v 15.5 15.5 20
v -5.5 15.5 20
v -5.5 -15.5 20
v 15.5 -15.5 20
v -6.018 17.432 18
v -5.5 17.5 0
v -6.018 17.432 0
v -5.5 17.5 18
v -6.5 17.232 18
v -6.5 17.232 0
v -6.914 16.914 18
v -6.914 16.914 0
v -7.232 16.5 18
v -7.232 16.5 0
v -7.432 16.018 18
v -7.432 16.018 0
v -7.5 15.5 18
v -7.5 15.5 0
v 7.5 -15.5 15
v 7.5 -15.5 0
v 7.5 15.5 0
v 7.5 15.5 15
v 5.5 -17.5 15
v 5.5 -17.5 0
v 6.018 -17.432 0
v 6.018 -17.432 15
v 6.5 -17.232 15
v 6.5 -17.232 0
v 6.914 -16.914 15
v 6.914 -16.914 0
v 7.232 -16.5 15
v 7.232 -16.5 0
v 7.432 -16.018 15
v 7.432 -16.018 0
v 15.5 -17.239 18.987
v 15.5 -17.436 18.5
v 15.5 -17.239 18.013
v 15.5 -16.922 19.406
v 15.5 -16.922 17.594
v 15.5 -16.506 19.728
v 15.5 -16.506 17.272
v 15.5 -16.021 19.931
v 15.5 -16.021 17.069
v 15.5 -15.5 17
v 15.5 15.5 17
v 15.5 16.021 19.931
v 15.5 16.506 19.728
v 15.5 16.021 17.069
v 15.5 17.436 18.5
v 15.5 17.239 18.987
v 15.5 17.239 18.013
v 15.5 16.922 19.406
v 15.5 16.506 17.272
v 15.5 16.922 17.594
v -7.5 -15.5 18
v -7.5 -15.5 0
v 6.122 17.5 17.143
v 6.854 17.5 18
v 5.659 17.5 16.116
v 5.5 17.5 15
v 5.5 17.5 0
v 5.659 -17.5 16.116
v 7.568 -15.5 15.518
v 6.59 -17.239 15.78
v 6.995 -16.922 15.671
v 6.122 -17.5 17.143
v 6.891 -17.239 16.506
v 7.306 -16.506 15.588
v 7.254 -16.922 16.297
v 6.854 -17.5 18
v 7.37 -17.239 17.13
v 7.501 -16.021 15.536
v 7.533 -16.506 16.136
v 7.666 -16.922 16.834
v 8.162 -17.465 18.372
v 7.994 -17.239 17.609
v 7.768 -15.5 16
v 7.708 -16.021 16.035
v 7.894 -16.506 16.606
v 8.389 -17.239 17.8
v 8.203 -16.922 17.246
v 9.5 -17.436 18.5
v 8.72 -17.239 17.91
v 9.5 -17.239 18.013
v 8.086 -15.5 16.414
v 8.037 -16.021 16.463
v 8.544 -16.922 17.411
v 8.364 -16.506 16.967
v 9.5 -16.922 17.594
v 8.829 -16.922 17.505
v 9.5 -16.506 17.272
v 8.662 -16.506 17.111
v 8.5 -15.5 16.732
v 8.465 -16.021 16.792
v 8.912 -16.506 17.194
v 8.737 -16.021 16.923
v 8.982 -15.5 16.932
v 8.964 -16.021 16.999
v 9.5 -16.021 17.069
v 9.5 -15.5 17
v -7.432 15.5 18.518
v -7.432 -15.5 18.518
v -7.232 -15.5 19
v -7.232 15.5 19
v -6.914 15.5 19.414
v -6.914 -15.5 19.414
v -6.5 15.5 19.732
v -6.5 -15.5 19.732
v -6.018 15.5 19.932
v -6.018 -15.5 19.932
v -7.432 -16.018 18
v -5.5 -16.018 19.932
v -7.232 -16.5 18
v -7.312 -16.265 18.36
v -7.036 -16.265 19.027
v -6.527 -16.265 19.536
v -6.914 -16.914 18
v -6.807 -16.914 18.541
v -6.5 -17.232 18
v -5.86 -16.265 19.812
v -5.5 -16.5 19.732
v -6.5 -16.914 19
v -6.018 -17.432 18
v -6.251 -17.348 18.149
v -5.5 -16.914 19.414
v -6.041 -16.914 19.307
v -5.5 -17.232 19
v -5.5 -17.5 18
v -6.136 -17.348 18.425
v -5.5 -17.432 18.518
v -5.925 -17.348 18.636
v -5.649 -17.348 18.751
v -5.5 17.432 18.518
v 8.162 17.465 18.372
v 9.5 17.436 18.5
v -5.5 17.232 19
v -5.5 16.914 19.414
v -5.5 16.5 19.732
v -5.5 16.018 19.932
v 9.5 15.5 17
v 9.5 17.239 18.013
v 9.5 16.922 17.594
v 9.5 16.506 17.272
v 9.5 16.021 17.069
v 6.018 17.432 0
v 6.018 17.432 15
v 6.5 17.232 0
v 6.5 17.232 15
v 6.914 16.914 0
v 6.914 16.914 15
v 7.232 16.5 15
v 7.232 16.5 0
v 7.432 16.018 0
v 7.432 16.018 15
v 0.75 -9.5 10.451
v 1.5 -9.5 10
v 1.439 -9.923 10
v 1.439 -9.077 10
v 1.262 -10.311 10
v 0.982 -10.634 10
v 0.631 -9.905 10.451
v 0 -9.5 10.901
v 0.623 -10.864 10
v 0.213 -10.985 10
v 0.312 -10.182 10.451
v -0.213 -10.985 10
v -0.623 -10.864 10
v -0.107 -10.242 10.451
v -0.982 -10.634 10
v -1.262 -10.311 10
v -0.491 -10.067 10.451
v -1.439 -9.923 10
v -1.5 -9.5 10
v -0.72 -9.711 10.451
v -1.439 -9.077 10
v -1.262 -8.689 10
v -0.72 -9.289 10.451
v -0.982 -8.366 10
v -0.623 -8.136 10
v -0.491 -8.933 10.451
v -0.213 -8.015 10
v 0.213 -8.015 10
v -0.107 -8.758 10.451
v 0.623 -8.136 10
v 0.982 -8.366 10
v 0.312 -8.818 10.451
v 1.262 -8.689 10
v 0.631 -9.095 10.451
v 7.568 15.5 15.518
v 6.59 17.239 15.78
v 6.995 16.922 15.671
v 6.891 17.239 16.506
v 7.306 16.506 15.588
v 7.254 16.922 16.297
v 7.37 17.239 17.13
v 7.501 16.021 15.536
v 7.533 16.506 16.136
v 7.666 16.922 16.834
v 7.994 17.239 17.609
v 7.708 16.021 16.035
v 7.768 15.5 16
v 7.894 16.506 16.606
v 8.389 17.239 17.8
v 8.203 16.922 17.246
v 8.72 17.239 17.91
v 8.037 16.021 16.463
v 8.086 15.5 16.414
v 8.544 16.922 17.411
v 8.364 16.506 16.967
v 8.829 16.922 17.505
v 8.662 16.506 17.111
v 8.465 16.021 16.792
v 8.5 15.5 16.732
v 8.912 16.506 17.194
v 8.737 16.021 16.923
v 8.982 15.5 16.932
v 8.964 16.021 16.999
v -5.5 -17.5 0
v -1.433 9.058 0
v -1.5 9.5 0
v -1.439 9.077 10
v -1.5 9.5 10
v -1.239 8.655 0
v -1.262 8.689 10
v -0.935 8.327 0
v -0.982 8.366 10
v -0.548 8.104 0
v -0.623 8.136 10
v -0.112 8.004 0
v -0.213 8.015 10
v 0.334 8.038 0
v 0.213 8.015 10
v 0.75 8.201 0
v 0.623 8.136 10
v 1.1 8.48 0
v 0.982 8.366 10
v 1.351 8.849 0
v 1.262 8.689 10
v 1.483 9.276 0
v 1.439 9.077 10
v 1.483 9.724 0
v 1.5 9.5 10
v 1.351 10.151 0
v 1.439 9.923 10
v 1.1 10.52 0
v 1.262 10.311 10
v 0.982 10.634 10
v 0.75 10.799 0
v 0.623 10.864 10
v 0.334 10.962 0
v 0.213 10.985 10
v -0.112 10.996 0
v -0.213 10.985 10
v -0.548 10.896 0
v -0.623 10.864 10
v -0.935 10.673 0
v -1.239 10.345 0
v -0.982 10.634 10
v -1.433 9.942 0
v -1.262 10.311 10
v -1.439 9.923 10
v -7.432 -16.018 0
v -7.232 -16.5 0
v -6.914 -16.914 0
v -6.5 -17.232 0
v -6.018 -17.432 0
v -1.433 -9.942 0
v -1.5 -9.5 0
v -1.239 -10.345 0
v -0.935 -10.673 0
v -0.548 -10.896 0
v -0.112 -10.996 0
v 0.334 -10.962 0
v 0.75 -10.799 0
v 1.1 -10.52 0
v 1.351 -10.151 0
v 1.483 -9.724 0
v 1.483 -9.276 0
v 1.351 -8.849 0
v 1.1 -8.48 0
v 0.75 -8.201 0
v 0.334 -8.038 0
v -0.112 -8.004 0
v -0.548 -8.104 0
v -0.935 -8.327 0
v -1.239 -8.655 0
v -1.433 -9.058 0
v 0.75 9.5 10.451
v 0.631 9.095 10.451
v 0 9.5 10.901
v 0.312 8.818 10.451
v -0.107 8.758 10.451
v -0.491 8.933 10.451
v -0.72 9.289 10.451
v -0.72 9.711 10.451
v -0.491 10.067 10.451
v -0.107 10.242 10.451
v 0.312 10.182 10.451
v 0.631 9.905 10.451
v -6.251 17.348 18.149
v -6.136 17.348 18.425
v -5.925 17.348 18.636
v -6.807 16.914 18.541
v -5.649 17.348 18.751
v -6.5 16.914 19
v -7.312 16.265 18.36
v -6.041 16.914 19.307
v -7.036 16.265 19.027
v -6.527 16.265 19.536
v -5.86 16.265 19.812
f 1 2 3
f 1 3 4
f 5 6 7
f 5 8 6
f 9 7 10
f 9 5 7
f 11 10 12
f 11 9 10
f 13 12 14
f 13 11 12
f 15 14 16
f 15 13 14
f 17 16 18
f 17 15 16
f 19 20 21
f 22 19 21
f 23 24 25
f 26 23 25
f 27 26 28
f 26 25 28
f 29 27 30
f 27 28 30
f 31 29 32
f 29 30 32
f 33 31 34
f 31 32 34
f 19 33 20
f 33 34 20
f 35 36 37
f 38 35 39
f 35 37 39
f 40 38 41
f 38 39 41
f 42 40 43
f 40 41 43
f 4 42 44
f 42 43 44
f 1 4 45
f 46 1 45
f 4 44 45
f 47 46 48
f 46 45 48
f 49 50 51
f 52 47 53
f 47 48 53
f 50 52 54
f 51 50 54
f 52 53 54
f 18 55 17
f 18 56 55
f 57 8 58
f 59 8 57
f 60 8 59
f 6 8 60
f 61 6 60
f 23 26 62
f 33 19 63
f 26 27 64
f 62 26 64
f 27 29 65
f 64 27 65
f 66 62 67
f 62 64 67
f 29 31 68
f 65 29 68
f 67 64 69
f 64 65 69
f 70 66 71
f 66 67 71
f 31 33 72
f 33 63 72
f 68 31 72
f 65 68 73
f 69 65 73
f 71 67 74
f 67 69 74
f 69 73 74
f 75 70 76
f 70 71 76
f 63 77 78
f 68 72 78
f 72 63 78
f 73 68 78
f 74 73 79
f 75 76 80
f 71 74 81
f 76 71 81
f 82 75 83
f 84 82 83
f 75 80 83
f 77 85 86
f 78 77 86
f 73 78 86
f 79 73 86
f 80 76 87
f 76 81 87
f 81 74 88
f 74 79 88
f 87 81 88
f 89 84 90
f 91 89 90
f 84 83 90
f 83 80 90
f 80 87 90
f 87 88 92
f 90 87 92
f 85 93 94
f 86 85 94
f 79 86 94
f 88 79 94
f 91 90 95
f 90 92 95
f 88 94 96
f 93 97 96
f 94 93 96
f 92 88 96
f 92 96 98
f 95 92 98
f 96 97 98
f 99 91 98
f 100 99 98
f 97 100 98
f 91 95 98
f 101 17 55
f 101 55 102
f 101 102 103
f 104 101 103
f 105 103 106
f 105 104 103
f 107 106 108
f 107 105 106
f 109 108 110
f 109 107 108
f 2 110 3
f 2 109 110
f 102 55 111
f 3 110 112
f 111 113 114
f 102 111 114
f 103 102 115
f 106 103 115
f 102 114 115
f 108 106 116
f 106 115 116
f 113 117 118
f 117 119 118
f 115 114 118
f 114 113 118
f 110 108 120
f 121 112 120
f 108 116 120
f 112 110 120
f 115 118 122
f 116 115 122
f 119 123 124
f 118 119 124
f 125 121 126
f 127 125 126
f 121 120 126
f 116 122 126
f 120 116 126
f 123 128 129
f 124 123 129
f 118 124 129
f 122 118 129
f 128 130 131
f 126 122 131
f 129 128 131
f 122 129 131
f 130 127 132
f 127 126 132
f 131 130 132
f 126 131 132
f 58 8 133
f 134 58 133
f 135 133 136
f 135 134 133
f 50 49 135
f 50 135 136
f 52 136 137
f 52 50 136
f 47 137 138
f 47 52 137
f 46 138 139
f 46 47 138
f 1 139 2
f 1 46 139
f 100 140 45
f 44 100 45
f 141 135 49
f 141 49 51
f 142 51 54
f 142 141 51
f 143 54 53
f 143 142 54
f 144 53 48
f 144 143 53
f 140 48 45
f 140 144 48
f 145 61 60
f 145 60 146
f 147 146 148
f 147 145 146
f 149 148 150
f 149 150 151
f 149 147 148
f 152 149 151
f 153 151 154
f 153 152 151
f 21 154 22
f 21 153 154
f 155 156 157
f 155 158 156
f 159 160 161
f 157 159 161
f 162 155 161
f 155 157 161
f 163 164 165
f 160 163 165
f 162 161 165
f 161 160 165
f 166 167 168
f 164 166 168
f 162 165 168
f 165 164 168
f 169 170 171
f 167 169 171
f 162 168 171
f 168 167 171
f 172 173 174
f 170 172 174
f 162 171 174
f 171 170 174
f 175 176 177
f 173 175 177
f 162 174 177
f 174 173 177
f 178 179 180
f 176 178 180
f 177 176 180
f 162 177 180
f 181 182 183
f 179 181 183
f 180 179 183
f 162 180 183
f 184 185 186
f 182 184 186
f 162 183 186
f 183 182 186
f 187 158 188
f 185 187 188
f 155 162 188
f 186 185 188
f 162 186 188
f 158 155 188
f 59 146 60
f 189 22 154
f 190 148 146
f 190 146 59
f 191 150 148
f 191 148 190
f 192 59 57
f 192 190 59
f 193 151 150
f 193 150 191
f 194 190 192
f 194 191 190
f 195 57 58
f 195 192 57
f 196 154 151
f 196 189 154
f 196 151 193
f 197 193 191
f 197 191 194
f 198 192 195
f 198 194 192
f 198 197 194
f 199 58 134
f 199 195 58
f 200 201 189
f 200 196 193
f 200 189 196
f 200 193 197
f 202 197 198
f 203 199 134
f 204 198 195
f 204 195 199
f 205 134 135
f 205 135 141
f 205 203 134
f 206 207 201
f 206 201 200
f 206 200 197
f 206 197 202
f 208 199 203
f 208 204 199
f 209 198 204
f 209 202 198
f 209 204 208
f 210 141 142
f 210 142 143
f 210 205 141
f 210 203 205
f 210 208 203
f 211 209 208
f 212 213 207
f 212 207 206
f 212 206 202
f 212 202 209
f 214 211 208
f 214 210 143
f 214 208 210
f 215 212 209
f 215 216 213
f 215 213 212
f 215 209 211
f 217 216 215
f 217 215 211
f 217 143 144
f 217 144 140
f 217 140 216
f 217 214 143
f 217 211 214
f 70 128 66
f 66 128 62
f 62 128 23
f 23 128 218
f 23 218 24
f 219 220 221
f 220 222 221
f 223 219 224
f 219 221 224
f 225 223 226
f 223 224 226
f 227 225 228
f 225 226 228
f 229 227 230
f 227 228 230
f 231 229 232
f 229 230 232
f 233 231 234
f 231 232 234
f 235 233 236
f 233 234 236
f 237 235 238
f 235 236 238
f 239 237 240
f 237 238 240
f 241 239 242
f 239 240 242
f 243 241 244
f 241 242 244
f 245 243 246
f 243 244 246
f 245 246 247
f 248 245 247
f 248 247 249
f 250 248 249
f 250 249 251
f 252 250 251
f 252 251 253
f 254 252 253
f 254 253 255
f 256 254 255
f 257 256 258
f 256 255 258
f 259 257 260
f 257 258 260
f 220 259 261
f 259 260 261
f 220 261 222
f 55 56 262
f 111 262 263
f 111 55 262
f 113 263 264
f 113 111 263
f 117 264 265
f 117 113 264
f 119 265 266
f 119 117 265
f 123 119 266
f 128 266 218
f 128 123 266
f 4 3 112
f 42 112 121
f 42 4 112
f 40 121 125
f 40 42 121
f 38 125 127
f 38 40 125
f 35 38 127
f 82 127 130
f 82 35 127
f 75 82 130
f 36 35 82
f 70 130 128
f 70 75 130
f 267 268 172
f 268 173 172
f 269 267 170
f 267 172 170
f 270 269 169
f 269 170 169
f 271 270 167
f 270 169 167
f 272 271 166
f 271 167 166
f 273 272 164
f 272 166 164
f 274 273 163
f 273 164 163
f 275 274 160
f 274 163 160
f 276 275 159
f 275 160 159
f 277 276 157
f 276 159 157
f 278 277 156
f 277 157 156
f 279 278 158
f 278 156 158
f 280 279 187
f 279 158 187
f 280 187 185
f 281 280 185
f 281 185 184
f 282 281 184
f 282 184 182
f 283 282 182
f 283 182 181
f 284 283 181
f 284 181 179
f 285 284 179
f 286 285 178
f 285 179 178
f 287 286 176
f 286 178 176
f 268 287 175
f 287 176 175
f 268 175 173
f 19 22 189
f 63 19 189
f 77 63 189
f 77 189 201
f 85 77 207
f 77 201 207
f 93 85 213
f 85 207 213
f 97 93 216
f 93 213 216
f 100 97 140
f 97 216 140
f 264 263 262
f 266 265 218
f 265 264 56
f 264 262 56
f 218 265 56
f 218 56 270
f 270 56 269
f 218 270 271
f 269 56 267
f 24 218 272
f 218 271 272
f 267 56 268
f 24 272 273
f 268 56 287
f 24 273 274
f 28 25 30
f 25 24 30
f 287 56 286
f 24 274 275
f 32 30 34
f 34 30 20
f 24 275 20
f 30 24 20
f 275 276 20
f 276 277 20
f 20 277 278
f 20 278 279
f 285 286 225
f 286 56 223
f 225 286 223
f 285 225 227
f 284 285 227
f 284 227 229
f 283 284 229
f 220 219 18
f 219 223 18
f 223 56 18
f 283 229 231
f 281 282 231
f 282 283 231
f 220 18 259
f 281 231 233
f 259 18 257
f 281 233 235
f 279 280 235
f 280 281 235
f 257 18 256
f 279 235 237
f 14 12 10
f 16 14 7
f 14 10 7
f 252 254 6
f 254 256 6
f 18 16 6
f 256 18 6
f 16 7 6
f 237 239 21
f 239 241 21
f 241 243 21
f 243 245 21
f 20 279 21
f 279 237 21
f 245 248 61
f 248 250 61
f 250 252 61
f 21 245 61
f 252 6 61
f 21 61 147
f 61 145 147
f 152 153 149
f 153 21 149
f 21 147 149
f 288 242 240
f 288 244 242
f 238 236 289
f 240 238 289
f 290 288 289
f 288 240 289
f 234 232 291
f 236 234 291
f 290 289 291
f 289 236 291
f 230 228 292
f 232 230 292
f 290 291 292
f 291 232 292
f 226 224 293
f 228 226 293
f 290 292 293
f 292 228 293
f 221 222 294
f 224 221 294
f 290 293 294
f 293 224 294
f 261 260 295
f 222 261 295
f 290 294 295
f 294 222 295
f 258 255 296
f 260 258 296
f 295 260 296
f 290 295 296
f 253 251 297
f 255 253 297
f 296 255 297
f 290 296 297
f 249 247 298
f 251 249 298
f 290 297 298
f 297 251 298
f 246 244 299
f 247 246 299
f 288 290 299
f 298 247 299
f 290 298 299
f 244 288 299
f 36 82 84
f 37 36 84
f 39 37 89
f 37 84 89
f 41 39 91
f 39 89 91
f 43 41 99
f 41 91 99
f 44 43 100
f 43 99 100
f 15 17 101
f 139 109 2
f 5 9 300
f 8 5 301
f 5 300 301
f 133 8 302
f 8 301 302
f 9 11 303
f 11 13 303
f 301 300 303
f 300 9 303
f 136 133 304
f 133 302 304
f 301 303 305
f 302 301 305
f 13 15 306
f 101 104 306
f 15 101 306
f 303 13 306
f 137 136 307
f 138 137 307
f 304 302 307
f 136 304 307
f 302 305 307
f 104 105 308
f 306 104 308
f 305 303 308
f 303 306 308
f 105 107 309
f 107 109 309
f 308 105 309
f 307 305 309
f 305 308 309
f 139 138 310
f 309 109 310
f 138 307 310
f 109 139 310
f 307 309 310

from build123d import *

# Parameters (mm, degrees)
F0_W         = 15
F0_H         = 35
F1_DEPTH     = 17
F2_W         = 23
F2_H         = 35
F3_DEPTH     = 3
F5_D         = 3
F5_DEPTH     = 10
F5_TIP       = 0.9012909285
F6_F1_R      = 2
F6_F2_R      = 2
F6_F3_R      = 2
F6_F4_R      = 2
F6_T5_DEPTH  = 20
F6_T7_DEPTH  = 11
F6_T10_ANGLE = 90
F6_T11_DEPTH = 20
F6_T13_DEPTH = 11
F6_T16_ANGLE = 90


# Not quite as in the source:
# - a fillet or chamfer that OpenCascade refuses, or shapes differently, is made with other operations: its cross-section is extruded or revolved along the edge and cut away or added


with BuildPart() as f1:
    # F0 (on Top) → F1 (new body)
    with BuildSketch(Plane.XY):
        Rectangle(F0_W, F0_H)
    extrude(amount=F1_DEPTH)

    # F2 (on face) → F3 (join)
    with BuildSketch(Plane.XY.offset(17)):
        with Locations((4, 0)):
            Rectangle(F2_W, F2_H)
    extrude(amount=F3_DEPTH)

    # F5
    with Locations(Plane(origin=(0, 0, 0), x_dir=(1, 0, 0), z_dir=(0, 0, -1))):
        with Locations((0, 9.5), (0, -9.5)):
            Hole(F5_D / 2, depth=F5_DEPTH)
            with Locations((0, 0, -(F5_DEPTH + F5_TIP / 2))):  # 118° drill point
                Cone(0, F5_D / 2, F5_TIP, mode=Mode.SUBTRACT)

    # F6: fillet of radius 2 on 8 edges, made by hand

    # F6_f1
    f6_f1_edges = [f1.edges().sort_by_distance(p)[0] for p in [
        (-7.5, 0, 20),
    ]]
    fillet(f6_f1_edges, radius=F6_F1_R)

    # F6_f2
    f6_f2_edges = [f1.edges().sort_by_distance(p)[0] for p in [
        (7.5, 0, 17),
    ]]
    fillet(f6_f2_edges, radius=F6_F2_R)

    # F6_f3
    f6_f3_edges = [f1.edges().sort_by_distance(p)[0] for p in [
        (5, -17.5, 20),
    ]]
    fillet(f6_f3_edges, radius=F6_F3_R)

    # F6_f4
    f6_f4_edges = [f1.edges().sort_by_distance(p)[0] for p in [
        (5, 17.5, 20),
    ]]
    fillet(f6_f4_edges, radius=F6_F4_R)

    # F6_s6 → F6_t5 (cut)
    with BuildSketch(Plane.XY.offset(-5)):
        with BuildLine():
            ThreePointArc((5.5, -17.5), (6.9142135624, -16.9142135624), (7.5, -15.5))
            Line((7.5, -15.5), (7.54, -15.5))
            Line((7.54, -15.5), (7.54, -17.54))
            Line((7.54, -17.54), (5.5, -17.54))
            Line((5.5, -17.54), (5.5, -17.5))
        make_face()
    extrude(amount=F6_T5_DEPTH, mode=Mode.SUBTRACT)

    # F6_s8 → F6_t7 (cut)
    with BuildSketch(Plane.YZ.offset(9.5)):
        with BuildLine():
            ThreePointArc((-17.5, 19), (-16.9142135624, 17.5857864376), (-15.5, 17))
            Line((-15.5, 17), (-15.5, 16.96))
            Line((-15.5, 16.96), (-17.54, 16.96))
            Line((-17.54, 16.96), (-17.54, 19))
            Line((-17.54, 19), (-17.5, 19))
        make_face()
    extrude(amount=F6_T7_DEPTH, mode=Mode.SUBTRACT)

    # F6_s9 → F6_t10 (revolve, cut)
    with BuildSketch(Plane.XY.offset(15)):
        with BuildLine():
            ThreePointArc((5.5, -17.5), (6.9142135624, -16.9142135624), (7.5, -15.5))
            Line((7.5, -15.5), (7.54, -15.5))
            Line((7.54, -15.5), (7.54, -17.54))
            Line((7.54, -17.54), (5.5, -17.54))
            Line((5.5, -17.54), (5.5, -17.5))
        make_face()
    revolve(axis=Axis((9.5, -17.5, 15), (0, 1, 0)), revolution_arc=F6_T10_ANGLE, mode=Mode.SUBTRACT)

    # F6_s12 → F6_t11 (cut)
    with BuildSketch(Plane.XY.offset(-5)):
        with BuildLine():
            ThreePointArc((5.5, 17.5), (6.9142135624, 16.9142135624), (7.5, 15.5))
            Line((7.5, 15.5), (7.54, 15.5))
            Line((7.54, 15.5), (7.54, 17.54))
            Line((7.54, 17.54), (5.5, 17.54))
            Line((5.5, 17.54), (5.5, 17.5))
        make_face()
    extrude(amount=F6_T11_DEPTH, mode=Mode.SUBTRACT)

    # F6_s14 → F6_t13 (cut)
    with BuildSketch(Plane.YZ.offset(9.5)):
        with BuildLine():
            ThreePointArc((17.5, 19), (16.9142135624, 17.5857864376), (15.5, 17))
            Line((15.5, 17), (15.5, 16.96))
            Line((15.5, 16.96), (17.54, 16.96))
            Line((17.54, 16.96), (17.54, 19))
            Line((17.54, 19), (17.5, 19))
        make_face()
    extrude(amount=F6_T13_DEPTH, mode=Mode.SUBTRACT)

    # F6_s15 → F6_t16 (revolve, cut)
    with BuildSketch(Plane.XY.offset(15)):
        with BuildLine():
            ThreePointArc((5.5, 17.5), (6.9142135624, 16.9142135624), (7.5, 15.5))
            Line((7.5, 15.5), (7.54, 15.5))
            Line((7.54, 15.5), (7.54, 17.54))
            Line((7.54, 17.54), (5.5, 17.54))
            Line((5.5, 17.54), (5.5, 17.5))
        make_face()
    revolve(axis=Axis((9.5, 17.5, 15), (0, 1, 0)), revolution_arc=F6_T16_ANGLE, mode=Mode.SUBTRACT)


solid = f1.part
